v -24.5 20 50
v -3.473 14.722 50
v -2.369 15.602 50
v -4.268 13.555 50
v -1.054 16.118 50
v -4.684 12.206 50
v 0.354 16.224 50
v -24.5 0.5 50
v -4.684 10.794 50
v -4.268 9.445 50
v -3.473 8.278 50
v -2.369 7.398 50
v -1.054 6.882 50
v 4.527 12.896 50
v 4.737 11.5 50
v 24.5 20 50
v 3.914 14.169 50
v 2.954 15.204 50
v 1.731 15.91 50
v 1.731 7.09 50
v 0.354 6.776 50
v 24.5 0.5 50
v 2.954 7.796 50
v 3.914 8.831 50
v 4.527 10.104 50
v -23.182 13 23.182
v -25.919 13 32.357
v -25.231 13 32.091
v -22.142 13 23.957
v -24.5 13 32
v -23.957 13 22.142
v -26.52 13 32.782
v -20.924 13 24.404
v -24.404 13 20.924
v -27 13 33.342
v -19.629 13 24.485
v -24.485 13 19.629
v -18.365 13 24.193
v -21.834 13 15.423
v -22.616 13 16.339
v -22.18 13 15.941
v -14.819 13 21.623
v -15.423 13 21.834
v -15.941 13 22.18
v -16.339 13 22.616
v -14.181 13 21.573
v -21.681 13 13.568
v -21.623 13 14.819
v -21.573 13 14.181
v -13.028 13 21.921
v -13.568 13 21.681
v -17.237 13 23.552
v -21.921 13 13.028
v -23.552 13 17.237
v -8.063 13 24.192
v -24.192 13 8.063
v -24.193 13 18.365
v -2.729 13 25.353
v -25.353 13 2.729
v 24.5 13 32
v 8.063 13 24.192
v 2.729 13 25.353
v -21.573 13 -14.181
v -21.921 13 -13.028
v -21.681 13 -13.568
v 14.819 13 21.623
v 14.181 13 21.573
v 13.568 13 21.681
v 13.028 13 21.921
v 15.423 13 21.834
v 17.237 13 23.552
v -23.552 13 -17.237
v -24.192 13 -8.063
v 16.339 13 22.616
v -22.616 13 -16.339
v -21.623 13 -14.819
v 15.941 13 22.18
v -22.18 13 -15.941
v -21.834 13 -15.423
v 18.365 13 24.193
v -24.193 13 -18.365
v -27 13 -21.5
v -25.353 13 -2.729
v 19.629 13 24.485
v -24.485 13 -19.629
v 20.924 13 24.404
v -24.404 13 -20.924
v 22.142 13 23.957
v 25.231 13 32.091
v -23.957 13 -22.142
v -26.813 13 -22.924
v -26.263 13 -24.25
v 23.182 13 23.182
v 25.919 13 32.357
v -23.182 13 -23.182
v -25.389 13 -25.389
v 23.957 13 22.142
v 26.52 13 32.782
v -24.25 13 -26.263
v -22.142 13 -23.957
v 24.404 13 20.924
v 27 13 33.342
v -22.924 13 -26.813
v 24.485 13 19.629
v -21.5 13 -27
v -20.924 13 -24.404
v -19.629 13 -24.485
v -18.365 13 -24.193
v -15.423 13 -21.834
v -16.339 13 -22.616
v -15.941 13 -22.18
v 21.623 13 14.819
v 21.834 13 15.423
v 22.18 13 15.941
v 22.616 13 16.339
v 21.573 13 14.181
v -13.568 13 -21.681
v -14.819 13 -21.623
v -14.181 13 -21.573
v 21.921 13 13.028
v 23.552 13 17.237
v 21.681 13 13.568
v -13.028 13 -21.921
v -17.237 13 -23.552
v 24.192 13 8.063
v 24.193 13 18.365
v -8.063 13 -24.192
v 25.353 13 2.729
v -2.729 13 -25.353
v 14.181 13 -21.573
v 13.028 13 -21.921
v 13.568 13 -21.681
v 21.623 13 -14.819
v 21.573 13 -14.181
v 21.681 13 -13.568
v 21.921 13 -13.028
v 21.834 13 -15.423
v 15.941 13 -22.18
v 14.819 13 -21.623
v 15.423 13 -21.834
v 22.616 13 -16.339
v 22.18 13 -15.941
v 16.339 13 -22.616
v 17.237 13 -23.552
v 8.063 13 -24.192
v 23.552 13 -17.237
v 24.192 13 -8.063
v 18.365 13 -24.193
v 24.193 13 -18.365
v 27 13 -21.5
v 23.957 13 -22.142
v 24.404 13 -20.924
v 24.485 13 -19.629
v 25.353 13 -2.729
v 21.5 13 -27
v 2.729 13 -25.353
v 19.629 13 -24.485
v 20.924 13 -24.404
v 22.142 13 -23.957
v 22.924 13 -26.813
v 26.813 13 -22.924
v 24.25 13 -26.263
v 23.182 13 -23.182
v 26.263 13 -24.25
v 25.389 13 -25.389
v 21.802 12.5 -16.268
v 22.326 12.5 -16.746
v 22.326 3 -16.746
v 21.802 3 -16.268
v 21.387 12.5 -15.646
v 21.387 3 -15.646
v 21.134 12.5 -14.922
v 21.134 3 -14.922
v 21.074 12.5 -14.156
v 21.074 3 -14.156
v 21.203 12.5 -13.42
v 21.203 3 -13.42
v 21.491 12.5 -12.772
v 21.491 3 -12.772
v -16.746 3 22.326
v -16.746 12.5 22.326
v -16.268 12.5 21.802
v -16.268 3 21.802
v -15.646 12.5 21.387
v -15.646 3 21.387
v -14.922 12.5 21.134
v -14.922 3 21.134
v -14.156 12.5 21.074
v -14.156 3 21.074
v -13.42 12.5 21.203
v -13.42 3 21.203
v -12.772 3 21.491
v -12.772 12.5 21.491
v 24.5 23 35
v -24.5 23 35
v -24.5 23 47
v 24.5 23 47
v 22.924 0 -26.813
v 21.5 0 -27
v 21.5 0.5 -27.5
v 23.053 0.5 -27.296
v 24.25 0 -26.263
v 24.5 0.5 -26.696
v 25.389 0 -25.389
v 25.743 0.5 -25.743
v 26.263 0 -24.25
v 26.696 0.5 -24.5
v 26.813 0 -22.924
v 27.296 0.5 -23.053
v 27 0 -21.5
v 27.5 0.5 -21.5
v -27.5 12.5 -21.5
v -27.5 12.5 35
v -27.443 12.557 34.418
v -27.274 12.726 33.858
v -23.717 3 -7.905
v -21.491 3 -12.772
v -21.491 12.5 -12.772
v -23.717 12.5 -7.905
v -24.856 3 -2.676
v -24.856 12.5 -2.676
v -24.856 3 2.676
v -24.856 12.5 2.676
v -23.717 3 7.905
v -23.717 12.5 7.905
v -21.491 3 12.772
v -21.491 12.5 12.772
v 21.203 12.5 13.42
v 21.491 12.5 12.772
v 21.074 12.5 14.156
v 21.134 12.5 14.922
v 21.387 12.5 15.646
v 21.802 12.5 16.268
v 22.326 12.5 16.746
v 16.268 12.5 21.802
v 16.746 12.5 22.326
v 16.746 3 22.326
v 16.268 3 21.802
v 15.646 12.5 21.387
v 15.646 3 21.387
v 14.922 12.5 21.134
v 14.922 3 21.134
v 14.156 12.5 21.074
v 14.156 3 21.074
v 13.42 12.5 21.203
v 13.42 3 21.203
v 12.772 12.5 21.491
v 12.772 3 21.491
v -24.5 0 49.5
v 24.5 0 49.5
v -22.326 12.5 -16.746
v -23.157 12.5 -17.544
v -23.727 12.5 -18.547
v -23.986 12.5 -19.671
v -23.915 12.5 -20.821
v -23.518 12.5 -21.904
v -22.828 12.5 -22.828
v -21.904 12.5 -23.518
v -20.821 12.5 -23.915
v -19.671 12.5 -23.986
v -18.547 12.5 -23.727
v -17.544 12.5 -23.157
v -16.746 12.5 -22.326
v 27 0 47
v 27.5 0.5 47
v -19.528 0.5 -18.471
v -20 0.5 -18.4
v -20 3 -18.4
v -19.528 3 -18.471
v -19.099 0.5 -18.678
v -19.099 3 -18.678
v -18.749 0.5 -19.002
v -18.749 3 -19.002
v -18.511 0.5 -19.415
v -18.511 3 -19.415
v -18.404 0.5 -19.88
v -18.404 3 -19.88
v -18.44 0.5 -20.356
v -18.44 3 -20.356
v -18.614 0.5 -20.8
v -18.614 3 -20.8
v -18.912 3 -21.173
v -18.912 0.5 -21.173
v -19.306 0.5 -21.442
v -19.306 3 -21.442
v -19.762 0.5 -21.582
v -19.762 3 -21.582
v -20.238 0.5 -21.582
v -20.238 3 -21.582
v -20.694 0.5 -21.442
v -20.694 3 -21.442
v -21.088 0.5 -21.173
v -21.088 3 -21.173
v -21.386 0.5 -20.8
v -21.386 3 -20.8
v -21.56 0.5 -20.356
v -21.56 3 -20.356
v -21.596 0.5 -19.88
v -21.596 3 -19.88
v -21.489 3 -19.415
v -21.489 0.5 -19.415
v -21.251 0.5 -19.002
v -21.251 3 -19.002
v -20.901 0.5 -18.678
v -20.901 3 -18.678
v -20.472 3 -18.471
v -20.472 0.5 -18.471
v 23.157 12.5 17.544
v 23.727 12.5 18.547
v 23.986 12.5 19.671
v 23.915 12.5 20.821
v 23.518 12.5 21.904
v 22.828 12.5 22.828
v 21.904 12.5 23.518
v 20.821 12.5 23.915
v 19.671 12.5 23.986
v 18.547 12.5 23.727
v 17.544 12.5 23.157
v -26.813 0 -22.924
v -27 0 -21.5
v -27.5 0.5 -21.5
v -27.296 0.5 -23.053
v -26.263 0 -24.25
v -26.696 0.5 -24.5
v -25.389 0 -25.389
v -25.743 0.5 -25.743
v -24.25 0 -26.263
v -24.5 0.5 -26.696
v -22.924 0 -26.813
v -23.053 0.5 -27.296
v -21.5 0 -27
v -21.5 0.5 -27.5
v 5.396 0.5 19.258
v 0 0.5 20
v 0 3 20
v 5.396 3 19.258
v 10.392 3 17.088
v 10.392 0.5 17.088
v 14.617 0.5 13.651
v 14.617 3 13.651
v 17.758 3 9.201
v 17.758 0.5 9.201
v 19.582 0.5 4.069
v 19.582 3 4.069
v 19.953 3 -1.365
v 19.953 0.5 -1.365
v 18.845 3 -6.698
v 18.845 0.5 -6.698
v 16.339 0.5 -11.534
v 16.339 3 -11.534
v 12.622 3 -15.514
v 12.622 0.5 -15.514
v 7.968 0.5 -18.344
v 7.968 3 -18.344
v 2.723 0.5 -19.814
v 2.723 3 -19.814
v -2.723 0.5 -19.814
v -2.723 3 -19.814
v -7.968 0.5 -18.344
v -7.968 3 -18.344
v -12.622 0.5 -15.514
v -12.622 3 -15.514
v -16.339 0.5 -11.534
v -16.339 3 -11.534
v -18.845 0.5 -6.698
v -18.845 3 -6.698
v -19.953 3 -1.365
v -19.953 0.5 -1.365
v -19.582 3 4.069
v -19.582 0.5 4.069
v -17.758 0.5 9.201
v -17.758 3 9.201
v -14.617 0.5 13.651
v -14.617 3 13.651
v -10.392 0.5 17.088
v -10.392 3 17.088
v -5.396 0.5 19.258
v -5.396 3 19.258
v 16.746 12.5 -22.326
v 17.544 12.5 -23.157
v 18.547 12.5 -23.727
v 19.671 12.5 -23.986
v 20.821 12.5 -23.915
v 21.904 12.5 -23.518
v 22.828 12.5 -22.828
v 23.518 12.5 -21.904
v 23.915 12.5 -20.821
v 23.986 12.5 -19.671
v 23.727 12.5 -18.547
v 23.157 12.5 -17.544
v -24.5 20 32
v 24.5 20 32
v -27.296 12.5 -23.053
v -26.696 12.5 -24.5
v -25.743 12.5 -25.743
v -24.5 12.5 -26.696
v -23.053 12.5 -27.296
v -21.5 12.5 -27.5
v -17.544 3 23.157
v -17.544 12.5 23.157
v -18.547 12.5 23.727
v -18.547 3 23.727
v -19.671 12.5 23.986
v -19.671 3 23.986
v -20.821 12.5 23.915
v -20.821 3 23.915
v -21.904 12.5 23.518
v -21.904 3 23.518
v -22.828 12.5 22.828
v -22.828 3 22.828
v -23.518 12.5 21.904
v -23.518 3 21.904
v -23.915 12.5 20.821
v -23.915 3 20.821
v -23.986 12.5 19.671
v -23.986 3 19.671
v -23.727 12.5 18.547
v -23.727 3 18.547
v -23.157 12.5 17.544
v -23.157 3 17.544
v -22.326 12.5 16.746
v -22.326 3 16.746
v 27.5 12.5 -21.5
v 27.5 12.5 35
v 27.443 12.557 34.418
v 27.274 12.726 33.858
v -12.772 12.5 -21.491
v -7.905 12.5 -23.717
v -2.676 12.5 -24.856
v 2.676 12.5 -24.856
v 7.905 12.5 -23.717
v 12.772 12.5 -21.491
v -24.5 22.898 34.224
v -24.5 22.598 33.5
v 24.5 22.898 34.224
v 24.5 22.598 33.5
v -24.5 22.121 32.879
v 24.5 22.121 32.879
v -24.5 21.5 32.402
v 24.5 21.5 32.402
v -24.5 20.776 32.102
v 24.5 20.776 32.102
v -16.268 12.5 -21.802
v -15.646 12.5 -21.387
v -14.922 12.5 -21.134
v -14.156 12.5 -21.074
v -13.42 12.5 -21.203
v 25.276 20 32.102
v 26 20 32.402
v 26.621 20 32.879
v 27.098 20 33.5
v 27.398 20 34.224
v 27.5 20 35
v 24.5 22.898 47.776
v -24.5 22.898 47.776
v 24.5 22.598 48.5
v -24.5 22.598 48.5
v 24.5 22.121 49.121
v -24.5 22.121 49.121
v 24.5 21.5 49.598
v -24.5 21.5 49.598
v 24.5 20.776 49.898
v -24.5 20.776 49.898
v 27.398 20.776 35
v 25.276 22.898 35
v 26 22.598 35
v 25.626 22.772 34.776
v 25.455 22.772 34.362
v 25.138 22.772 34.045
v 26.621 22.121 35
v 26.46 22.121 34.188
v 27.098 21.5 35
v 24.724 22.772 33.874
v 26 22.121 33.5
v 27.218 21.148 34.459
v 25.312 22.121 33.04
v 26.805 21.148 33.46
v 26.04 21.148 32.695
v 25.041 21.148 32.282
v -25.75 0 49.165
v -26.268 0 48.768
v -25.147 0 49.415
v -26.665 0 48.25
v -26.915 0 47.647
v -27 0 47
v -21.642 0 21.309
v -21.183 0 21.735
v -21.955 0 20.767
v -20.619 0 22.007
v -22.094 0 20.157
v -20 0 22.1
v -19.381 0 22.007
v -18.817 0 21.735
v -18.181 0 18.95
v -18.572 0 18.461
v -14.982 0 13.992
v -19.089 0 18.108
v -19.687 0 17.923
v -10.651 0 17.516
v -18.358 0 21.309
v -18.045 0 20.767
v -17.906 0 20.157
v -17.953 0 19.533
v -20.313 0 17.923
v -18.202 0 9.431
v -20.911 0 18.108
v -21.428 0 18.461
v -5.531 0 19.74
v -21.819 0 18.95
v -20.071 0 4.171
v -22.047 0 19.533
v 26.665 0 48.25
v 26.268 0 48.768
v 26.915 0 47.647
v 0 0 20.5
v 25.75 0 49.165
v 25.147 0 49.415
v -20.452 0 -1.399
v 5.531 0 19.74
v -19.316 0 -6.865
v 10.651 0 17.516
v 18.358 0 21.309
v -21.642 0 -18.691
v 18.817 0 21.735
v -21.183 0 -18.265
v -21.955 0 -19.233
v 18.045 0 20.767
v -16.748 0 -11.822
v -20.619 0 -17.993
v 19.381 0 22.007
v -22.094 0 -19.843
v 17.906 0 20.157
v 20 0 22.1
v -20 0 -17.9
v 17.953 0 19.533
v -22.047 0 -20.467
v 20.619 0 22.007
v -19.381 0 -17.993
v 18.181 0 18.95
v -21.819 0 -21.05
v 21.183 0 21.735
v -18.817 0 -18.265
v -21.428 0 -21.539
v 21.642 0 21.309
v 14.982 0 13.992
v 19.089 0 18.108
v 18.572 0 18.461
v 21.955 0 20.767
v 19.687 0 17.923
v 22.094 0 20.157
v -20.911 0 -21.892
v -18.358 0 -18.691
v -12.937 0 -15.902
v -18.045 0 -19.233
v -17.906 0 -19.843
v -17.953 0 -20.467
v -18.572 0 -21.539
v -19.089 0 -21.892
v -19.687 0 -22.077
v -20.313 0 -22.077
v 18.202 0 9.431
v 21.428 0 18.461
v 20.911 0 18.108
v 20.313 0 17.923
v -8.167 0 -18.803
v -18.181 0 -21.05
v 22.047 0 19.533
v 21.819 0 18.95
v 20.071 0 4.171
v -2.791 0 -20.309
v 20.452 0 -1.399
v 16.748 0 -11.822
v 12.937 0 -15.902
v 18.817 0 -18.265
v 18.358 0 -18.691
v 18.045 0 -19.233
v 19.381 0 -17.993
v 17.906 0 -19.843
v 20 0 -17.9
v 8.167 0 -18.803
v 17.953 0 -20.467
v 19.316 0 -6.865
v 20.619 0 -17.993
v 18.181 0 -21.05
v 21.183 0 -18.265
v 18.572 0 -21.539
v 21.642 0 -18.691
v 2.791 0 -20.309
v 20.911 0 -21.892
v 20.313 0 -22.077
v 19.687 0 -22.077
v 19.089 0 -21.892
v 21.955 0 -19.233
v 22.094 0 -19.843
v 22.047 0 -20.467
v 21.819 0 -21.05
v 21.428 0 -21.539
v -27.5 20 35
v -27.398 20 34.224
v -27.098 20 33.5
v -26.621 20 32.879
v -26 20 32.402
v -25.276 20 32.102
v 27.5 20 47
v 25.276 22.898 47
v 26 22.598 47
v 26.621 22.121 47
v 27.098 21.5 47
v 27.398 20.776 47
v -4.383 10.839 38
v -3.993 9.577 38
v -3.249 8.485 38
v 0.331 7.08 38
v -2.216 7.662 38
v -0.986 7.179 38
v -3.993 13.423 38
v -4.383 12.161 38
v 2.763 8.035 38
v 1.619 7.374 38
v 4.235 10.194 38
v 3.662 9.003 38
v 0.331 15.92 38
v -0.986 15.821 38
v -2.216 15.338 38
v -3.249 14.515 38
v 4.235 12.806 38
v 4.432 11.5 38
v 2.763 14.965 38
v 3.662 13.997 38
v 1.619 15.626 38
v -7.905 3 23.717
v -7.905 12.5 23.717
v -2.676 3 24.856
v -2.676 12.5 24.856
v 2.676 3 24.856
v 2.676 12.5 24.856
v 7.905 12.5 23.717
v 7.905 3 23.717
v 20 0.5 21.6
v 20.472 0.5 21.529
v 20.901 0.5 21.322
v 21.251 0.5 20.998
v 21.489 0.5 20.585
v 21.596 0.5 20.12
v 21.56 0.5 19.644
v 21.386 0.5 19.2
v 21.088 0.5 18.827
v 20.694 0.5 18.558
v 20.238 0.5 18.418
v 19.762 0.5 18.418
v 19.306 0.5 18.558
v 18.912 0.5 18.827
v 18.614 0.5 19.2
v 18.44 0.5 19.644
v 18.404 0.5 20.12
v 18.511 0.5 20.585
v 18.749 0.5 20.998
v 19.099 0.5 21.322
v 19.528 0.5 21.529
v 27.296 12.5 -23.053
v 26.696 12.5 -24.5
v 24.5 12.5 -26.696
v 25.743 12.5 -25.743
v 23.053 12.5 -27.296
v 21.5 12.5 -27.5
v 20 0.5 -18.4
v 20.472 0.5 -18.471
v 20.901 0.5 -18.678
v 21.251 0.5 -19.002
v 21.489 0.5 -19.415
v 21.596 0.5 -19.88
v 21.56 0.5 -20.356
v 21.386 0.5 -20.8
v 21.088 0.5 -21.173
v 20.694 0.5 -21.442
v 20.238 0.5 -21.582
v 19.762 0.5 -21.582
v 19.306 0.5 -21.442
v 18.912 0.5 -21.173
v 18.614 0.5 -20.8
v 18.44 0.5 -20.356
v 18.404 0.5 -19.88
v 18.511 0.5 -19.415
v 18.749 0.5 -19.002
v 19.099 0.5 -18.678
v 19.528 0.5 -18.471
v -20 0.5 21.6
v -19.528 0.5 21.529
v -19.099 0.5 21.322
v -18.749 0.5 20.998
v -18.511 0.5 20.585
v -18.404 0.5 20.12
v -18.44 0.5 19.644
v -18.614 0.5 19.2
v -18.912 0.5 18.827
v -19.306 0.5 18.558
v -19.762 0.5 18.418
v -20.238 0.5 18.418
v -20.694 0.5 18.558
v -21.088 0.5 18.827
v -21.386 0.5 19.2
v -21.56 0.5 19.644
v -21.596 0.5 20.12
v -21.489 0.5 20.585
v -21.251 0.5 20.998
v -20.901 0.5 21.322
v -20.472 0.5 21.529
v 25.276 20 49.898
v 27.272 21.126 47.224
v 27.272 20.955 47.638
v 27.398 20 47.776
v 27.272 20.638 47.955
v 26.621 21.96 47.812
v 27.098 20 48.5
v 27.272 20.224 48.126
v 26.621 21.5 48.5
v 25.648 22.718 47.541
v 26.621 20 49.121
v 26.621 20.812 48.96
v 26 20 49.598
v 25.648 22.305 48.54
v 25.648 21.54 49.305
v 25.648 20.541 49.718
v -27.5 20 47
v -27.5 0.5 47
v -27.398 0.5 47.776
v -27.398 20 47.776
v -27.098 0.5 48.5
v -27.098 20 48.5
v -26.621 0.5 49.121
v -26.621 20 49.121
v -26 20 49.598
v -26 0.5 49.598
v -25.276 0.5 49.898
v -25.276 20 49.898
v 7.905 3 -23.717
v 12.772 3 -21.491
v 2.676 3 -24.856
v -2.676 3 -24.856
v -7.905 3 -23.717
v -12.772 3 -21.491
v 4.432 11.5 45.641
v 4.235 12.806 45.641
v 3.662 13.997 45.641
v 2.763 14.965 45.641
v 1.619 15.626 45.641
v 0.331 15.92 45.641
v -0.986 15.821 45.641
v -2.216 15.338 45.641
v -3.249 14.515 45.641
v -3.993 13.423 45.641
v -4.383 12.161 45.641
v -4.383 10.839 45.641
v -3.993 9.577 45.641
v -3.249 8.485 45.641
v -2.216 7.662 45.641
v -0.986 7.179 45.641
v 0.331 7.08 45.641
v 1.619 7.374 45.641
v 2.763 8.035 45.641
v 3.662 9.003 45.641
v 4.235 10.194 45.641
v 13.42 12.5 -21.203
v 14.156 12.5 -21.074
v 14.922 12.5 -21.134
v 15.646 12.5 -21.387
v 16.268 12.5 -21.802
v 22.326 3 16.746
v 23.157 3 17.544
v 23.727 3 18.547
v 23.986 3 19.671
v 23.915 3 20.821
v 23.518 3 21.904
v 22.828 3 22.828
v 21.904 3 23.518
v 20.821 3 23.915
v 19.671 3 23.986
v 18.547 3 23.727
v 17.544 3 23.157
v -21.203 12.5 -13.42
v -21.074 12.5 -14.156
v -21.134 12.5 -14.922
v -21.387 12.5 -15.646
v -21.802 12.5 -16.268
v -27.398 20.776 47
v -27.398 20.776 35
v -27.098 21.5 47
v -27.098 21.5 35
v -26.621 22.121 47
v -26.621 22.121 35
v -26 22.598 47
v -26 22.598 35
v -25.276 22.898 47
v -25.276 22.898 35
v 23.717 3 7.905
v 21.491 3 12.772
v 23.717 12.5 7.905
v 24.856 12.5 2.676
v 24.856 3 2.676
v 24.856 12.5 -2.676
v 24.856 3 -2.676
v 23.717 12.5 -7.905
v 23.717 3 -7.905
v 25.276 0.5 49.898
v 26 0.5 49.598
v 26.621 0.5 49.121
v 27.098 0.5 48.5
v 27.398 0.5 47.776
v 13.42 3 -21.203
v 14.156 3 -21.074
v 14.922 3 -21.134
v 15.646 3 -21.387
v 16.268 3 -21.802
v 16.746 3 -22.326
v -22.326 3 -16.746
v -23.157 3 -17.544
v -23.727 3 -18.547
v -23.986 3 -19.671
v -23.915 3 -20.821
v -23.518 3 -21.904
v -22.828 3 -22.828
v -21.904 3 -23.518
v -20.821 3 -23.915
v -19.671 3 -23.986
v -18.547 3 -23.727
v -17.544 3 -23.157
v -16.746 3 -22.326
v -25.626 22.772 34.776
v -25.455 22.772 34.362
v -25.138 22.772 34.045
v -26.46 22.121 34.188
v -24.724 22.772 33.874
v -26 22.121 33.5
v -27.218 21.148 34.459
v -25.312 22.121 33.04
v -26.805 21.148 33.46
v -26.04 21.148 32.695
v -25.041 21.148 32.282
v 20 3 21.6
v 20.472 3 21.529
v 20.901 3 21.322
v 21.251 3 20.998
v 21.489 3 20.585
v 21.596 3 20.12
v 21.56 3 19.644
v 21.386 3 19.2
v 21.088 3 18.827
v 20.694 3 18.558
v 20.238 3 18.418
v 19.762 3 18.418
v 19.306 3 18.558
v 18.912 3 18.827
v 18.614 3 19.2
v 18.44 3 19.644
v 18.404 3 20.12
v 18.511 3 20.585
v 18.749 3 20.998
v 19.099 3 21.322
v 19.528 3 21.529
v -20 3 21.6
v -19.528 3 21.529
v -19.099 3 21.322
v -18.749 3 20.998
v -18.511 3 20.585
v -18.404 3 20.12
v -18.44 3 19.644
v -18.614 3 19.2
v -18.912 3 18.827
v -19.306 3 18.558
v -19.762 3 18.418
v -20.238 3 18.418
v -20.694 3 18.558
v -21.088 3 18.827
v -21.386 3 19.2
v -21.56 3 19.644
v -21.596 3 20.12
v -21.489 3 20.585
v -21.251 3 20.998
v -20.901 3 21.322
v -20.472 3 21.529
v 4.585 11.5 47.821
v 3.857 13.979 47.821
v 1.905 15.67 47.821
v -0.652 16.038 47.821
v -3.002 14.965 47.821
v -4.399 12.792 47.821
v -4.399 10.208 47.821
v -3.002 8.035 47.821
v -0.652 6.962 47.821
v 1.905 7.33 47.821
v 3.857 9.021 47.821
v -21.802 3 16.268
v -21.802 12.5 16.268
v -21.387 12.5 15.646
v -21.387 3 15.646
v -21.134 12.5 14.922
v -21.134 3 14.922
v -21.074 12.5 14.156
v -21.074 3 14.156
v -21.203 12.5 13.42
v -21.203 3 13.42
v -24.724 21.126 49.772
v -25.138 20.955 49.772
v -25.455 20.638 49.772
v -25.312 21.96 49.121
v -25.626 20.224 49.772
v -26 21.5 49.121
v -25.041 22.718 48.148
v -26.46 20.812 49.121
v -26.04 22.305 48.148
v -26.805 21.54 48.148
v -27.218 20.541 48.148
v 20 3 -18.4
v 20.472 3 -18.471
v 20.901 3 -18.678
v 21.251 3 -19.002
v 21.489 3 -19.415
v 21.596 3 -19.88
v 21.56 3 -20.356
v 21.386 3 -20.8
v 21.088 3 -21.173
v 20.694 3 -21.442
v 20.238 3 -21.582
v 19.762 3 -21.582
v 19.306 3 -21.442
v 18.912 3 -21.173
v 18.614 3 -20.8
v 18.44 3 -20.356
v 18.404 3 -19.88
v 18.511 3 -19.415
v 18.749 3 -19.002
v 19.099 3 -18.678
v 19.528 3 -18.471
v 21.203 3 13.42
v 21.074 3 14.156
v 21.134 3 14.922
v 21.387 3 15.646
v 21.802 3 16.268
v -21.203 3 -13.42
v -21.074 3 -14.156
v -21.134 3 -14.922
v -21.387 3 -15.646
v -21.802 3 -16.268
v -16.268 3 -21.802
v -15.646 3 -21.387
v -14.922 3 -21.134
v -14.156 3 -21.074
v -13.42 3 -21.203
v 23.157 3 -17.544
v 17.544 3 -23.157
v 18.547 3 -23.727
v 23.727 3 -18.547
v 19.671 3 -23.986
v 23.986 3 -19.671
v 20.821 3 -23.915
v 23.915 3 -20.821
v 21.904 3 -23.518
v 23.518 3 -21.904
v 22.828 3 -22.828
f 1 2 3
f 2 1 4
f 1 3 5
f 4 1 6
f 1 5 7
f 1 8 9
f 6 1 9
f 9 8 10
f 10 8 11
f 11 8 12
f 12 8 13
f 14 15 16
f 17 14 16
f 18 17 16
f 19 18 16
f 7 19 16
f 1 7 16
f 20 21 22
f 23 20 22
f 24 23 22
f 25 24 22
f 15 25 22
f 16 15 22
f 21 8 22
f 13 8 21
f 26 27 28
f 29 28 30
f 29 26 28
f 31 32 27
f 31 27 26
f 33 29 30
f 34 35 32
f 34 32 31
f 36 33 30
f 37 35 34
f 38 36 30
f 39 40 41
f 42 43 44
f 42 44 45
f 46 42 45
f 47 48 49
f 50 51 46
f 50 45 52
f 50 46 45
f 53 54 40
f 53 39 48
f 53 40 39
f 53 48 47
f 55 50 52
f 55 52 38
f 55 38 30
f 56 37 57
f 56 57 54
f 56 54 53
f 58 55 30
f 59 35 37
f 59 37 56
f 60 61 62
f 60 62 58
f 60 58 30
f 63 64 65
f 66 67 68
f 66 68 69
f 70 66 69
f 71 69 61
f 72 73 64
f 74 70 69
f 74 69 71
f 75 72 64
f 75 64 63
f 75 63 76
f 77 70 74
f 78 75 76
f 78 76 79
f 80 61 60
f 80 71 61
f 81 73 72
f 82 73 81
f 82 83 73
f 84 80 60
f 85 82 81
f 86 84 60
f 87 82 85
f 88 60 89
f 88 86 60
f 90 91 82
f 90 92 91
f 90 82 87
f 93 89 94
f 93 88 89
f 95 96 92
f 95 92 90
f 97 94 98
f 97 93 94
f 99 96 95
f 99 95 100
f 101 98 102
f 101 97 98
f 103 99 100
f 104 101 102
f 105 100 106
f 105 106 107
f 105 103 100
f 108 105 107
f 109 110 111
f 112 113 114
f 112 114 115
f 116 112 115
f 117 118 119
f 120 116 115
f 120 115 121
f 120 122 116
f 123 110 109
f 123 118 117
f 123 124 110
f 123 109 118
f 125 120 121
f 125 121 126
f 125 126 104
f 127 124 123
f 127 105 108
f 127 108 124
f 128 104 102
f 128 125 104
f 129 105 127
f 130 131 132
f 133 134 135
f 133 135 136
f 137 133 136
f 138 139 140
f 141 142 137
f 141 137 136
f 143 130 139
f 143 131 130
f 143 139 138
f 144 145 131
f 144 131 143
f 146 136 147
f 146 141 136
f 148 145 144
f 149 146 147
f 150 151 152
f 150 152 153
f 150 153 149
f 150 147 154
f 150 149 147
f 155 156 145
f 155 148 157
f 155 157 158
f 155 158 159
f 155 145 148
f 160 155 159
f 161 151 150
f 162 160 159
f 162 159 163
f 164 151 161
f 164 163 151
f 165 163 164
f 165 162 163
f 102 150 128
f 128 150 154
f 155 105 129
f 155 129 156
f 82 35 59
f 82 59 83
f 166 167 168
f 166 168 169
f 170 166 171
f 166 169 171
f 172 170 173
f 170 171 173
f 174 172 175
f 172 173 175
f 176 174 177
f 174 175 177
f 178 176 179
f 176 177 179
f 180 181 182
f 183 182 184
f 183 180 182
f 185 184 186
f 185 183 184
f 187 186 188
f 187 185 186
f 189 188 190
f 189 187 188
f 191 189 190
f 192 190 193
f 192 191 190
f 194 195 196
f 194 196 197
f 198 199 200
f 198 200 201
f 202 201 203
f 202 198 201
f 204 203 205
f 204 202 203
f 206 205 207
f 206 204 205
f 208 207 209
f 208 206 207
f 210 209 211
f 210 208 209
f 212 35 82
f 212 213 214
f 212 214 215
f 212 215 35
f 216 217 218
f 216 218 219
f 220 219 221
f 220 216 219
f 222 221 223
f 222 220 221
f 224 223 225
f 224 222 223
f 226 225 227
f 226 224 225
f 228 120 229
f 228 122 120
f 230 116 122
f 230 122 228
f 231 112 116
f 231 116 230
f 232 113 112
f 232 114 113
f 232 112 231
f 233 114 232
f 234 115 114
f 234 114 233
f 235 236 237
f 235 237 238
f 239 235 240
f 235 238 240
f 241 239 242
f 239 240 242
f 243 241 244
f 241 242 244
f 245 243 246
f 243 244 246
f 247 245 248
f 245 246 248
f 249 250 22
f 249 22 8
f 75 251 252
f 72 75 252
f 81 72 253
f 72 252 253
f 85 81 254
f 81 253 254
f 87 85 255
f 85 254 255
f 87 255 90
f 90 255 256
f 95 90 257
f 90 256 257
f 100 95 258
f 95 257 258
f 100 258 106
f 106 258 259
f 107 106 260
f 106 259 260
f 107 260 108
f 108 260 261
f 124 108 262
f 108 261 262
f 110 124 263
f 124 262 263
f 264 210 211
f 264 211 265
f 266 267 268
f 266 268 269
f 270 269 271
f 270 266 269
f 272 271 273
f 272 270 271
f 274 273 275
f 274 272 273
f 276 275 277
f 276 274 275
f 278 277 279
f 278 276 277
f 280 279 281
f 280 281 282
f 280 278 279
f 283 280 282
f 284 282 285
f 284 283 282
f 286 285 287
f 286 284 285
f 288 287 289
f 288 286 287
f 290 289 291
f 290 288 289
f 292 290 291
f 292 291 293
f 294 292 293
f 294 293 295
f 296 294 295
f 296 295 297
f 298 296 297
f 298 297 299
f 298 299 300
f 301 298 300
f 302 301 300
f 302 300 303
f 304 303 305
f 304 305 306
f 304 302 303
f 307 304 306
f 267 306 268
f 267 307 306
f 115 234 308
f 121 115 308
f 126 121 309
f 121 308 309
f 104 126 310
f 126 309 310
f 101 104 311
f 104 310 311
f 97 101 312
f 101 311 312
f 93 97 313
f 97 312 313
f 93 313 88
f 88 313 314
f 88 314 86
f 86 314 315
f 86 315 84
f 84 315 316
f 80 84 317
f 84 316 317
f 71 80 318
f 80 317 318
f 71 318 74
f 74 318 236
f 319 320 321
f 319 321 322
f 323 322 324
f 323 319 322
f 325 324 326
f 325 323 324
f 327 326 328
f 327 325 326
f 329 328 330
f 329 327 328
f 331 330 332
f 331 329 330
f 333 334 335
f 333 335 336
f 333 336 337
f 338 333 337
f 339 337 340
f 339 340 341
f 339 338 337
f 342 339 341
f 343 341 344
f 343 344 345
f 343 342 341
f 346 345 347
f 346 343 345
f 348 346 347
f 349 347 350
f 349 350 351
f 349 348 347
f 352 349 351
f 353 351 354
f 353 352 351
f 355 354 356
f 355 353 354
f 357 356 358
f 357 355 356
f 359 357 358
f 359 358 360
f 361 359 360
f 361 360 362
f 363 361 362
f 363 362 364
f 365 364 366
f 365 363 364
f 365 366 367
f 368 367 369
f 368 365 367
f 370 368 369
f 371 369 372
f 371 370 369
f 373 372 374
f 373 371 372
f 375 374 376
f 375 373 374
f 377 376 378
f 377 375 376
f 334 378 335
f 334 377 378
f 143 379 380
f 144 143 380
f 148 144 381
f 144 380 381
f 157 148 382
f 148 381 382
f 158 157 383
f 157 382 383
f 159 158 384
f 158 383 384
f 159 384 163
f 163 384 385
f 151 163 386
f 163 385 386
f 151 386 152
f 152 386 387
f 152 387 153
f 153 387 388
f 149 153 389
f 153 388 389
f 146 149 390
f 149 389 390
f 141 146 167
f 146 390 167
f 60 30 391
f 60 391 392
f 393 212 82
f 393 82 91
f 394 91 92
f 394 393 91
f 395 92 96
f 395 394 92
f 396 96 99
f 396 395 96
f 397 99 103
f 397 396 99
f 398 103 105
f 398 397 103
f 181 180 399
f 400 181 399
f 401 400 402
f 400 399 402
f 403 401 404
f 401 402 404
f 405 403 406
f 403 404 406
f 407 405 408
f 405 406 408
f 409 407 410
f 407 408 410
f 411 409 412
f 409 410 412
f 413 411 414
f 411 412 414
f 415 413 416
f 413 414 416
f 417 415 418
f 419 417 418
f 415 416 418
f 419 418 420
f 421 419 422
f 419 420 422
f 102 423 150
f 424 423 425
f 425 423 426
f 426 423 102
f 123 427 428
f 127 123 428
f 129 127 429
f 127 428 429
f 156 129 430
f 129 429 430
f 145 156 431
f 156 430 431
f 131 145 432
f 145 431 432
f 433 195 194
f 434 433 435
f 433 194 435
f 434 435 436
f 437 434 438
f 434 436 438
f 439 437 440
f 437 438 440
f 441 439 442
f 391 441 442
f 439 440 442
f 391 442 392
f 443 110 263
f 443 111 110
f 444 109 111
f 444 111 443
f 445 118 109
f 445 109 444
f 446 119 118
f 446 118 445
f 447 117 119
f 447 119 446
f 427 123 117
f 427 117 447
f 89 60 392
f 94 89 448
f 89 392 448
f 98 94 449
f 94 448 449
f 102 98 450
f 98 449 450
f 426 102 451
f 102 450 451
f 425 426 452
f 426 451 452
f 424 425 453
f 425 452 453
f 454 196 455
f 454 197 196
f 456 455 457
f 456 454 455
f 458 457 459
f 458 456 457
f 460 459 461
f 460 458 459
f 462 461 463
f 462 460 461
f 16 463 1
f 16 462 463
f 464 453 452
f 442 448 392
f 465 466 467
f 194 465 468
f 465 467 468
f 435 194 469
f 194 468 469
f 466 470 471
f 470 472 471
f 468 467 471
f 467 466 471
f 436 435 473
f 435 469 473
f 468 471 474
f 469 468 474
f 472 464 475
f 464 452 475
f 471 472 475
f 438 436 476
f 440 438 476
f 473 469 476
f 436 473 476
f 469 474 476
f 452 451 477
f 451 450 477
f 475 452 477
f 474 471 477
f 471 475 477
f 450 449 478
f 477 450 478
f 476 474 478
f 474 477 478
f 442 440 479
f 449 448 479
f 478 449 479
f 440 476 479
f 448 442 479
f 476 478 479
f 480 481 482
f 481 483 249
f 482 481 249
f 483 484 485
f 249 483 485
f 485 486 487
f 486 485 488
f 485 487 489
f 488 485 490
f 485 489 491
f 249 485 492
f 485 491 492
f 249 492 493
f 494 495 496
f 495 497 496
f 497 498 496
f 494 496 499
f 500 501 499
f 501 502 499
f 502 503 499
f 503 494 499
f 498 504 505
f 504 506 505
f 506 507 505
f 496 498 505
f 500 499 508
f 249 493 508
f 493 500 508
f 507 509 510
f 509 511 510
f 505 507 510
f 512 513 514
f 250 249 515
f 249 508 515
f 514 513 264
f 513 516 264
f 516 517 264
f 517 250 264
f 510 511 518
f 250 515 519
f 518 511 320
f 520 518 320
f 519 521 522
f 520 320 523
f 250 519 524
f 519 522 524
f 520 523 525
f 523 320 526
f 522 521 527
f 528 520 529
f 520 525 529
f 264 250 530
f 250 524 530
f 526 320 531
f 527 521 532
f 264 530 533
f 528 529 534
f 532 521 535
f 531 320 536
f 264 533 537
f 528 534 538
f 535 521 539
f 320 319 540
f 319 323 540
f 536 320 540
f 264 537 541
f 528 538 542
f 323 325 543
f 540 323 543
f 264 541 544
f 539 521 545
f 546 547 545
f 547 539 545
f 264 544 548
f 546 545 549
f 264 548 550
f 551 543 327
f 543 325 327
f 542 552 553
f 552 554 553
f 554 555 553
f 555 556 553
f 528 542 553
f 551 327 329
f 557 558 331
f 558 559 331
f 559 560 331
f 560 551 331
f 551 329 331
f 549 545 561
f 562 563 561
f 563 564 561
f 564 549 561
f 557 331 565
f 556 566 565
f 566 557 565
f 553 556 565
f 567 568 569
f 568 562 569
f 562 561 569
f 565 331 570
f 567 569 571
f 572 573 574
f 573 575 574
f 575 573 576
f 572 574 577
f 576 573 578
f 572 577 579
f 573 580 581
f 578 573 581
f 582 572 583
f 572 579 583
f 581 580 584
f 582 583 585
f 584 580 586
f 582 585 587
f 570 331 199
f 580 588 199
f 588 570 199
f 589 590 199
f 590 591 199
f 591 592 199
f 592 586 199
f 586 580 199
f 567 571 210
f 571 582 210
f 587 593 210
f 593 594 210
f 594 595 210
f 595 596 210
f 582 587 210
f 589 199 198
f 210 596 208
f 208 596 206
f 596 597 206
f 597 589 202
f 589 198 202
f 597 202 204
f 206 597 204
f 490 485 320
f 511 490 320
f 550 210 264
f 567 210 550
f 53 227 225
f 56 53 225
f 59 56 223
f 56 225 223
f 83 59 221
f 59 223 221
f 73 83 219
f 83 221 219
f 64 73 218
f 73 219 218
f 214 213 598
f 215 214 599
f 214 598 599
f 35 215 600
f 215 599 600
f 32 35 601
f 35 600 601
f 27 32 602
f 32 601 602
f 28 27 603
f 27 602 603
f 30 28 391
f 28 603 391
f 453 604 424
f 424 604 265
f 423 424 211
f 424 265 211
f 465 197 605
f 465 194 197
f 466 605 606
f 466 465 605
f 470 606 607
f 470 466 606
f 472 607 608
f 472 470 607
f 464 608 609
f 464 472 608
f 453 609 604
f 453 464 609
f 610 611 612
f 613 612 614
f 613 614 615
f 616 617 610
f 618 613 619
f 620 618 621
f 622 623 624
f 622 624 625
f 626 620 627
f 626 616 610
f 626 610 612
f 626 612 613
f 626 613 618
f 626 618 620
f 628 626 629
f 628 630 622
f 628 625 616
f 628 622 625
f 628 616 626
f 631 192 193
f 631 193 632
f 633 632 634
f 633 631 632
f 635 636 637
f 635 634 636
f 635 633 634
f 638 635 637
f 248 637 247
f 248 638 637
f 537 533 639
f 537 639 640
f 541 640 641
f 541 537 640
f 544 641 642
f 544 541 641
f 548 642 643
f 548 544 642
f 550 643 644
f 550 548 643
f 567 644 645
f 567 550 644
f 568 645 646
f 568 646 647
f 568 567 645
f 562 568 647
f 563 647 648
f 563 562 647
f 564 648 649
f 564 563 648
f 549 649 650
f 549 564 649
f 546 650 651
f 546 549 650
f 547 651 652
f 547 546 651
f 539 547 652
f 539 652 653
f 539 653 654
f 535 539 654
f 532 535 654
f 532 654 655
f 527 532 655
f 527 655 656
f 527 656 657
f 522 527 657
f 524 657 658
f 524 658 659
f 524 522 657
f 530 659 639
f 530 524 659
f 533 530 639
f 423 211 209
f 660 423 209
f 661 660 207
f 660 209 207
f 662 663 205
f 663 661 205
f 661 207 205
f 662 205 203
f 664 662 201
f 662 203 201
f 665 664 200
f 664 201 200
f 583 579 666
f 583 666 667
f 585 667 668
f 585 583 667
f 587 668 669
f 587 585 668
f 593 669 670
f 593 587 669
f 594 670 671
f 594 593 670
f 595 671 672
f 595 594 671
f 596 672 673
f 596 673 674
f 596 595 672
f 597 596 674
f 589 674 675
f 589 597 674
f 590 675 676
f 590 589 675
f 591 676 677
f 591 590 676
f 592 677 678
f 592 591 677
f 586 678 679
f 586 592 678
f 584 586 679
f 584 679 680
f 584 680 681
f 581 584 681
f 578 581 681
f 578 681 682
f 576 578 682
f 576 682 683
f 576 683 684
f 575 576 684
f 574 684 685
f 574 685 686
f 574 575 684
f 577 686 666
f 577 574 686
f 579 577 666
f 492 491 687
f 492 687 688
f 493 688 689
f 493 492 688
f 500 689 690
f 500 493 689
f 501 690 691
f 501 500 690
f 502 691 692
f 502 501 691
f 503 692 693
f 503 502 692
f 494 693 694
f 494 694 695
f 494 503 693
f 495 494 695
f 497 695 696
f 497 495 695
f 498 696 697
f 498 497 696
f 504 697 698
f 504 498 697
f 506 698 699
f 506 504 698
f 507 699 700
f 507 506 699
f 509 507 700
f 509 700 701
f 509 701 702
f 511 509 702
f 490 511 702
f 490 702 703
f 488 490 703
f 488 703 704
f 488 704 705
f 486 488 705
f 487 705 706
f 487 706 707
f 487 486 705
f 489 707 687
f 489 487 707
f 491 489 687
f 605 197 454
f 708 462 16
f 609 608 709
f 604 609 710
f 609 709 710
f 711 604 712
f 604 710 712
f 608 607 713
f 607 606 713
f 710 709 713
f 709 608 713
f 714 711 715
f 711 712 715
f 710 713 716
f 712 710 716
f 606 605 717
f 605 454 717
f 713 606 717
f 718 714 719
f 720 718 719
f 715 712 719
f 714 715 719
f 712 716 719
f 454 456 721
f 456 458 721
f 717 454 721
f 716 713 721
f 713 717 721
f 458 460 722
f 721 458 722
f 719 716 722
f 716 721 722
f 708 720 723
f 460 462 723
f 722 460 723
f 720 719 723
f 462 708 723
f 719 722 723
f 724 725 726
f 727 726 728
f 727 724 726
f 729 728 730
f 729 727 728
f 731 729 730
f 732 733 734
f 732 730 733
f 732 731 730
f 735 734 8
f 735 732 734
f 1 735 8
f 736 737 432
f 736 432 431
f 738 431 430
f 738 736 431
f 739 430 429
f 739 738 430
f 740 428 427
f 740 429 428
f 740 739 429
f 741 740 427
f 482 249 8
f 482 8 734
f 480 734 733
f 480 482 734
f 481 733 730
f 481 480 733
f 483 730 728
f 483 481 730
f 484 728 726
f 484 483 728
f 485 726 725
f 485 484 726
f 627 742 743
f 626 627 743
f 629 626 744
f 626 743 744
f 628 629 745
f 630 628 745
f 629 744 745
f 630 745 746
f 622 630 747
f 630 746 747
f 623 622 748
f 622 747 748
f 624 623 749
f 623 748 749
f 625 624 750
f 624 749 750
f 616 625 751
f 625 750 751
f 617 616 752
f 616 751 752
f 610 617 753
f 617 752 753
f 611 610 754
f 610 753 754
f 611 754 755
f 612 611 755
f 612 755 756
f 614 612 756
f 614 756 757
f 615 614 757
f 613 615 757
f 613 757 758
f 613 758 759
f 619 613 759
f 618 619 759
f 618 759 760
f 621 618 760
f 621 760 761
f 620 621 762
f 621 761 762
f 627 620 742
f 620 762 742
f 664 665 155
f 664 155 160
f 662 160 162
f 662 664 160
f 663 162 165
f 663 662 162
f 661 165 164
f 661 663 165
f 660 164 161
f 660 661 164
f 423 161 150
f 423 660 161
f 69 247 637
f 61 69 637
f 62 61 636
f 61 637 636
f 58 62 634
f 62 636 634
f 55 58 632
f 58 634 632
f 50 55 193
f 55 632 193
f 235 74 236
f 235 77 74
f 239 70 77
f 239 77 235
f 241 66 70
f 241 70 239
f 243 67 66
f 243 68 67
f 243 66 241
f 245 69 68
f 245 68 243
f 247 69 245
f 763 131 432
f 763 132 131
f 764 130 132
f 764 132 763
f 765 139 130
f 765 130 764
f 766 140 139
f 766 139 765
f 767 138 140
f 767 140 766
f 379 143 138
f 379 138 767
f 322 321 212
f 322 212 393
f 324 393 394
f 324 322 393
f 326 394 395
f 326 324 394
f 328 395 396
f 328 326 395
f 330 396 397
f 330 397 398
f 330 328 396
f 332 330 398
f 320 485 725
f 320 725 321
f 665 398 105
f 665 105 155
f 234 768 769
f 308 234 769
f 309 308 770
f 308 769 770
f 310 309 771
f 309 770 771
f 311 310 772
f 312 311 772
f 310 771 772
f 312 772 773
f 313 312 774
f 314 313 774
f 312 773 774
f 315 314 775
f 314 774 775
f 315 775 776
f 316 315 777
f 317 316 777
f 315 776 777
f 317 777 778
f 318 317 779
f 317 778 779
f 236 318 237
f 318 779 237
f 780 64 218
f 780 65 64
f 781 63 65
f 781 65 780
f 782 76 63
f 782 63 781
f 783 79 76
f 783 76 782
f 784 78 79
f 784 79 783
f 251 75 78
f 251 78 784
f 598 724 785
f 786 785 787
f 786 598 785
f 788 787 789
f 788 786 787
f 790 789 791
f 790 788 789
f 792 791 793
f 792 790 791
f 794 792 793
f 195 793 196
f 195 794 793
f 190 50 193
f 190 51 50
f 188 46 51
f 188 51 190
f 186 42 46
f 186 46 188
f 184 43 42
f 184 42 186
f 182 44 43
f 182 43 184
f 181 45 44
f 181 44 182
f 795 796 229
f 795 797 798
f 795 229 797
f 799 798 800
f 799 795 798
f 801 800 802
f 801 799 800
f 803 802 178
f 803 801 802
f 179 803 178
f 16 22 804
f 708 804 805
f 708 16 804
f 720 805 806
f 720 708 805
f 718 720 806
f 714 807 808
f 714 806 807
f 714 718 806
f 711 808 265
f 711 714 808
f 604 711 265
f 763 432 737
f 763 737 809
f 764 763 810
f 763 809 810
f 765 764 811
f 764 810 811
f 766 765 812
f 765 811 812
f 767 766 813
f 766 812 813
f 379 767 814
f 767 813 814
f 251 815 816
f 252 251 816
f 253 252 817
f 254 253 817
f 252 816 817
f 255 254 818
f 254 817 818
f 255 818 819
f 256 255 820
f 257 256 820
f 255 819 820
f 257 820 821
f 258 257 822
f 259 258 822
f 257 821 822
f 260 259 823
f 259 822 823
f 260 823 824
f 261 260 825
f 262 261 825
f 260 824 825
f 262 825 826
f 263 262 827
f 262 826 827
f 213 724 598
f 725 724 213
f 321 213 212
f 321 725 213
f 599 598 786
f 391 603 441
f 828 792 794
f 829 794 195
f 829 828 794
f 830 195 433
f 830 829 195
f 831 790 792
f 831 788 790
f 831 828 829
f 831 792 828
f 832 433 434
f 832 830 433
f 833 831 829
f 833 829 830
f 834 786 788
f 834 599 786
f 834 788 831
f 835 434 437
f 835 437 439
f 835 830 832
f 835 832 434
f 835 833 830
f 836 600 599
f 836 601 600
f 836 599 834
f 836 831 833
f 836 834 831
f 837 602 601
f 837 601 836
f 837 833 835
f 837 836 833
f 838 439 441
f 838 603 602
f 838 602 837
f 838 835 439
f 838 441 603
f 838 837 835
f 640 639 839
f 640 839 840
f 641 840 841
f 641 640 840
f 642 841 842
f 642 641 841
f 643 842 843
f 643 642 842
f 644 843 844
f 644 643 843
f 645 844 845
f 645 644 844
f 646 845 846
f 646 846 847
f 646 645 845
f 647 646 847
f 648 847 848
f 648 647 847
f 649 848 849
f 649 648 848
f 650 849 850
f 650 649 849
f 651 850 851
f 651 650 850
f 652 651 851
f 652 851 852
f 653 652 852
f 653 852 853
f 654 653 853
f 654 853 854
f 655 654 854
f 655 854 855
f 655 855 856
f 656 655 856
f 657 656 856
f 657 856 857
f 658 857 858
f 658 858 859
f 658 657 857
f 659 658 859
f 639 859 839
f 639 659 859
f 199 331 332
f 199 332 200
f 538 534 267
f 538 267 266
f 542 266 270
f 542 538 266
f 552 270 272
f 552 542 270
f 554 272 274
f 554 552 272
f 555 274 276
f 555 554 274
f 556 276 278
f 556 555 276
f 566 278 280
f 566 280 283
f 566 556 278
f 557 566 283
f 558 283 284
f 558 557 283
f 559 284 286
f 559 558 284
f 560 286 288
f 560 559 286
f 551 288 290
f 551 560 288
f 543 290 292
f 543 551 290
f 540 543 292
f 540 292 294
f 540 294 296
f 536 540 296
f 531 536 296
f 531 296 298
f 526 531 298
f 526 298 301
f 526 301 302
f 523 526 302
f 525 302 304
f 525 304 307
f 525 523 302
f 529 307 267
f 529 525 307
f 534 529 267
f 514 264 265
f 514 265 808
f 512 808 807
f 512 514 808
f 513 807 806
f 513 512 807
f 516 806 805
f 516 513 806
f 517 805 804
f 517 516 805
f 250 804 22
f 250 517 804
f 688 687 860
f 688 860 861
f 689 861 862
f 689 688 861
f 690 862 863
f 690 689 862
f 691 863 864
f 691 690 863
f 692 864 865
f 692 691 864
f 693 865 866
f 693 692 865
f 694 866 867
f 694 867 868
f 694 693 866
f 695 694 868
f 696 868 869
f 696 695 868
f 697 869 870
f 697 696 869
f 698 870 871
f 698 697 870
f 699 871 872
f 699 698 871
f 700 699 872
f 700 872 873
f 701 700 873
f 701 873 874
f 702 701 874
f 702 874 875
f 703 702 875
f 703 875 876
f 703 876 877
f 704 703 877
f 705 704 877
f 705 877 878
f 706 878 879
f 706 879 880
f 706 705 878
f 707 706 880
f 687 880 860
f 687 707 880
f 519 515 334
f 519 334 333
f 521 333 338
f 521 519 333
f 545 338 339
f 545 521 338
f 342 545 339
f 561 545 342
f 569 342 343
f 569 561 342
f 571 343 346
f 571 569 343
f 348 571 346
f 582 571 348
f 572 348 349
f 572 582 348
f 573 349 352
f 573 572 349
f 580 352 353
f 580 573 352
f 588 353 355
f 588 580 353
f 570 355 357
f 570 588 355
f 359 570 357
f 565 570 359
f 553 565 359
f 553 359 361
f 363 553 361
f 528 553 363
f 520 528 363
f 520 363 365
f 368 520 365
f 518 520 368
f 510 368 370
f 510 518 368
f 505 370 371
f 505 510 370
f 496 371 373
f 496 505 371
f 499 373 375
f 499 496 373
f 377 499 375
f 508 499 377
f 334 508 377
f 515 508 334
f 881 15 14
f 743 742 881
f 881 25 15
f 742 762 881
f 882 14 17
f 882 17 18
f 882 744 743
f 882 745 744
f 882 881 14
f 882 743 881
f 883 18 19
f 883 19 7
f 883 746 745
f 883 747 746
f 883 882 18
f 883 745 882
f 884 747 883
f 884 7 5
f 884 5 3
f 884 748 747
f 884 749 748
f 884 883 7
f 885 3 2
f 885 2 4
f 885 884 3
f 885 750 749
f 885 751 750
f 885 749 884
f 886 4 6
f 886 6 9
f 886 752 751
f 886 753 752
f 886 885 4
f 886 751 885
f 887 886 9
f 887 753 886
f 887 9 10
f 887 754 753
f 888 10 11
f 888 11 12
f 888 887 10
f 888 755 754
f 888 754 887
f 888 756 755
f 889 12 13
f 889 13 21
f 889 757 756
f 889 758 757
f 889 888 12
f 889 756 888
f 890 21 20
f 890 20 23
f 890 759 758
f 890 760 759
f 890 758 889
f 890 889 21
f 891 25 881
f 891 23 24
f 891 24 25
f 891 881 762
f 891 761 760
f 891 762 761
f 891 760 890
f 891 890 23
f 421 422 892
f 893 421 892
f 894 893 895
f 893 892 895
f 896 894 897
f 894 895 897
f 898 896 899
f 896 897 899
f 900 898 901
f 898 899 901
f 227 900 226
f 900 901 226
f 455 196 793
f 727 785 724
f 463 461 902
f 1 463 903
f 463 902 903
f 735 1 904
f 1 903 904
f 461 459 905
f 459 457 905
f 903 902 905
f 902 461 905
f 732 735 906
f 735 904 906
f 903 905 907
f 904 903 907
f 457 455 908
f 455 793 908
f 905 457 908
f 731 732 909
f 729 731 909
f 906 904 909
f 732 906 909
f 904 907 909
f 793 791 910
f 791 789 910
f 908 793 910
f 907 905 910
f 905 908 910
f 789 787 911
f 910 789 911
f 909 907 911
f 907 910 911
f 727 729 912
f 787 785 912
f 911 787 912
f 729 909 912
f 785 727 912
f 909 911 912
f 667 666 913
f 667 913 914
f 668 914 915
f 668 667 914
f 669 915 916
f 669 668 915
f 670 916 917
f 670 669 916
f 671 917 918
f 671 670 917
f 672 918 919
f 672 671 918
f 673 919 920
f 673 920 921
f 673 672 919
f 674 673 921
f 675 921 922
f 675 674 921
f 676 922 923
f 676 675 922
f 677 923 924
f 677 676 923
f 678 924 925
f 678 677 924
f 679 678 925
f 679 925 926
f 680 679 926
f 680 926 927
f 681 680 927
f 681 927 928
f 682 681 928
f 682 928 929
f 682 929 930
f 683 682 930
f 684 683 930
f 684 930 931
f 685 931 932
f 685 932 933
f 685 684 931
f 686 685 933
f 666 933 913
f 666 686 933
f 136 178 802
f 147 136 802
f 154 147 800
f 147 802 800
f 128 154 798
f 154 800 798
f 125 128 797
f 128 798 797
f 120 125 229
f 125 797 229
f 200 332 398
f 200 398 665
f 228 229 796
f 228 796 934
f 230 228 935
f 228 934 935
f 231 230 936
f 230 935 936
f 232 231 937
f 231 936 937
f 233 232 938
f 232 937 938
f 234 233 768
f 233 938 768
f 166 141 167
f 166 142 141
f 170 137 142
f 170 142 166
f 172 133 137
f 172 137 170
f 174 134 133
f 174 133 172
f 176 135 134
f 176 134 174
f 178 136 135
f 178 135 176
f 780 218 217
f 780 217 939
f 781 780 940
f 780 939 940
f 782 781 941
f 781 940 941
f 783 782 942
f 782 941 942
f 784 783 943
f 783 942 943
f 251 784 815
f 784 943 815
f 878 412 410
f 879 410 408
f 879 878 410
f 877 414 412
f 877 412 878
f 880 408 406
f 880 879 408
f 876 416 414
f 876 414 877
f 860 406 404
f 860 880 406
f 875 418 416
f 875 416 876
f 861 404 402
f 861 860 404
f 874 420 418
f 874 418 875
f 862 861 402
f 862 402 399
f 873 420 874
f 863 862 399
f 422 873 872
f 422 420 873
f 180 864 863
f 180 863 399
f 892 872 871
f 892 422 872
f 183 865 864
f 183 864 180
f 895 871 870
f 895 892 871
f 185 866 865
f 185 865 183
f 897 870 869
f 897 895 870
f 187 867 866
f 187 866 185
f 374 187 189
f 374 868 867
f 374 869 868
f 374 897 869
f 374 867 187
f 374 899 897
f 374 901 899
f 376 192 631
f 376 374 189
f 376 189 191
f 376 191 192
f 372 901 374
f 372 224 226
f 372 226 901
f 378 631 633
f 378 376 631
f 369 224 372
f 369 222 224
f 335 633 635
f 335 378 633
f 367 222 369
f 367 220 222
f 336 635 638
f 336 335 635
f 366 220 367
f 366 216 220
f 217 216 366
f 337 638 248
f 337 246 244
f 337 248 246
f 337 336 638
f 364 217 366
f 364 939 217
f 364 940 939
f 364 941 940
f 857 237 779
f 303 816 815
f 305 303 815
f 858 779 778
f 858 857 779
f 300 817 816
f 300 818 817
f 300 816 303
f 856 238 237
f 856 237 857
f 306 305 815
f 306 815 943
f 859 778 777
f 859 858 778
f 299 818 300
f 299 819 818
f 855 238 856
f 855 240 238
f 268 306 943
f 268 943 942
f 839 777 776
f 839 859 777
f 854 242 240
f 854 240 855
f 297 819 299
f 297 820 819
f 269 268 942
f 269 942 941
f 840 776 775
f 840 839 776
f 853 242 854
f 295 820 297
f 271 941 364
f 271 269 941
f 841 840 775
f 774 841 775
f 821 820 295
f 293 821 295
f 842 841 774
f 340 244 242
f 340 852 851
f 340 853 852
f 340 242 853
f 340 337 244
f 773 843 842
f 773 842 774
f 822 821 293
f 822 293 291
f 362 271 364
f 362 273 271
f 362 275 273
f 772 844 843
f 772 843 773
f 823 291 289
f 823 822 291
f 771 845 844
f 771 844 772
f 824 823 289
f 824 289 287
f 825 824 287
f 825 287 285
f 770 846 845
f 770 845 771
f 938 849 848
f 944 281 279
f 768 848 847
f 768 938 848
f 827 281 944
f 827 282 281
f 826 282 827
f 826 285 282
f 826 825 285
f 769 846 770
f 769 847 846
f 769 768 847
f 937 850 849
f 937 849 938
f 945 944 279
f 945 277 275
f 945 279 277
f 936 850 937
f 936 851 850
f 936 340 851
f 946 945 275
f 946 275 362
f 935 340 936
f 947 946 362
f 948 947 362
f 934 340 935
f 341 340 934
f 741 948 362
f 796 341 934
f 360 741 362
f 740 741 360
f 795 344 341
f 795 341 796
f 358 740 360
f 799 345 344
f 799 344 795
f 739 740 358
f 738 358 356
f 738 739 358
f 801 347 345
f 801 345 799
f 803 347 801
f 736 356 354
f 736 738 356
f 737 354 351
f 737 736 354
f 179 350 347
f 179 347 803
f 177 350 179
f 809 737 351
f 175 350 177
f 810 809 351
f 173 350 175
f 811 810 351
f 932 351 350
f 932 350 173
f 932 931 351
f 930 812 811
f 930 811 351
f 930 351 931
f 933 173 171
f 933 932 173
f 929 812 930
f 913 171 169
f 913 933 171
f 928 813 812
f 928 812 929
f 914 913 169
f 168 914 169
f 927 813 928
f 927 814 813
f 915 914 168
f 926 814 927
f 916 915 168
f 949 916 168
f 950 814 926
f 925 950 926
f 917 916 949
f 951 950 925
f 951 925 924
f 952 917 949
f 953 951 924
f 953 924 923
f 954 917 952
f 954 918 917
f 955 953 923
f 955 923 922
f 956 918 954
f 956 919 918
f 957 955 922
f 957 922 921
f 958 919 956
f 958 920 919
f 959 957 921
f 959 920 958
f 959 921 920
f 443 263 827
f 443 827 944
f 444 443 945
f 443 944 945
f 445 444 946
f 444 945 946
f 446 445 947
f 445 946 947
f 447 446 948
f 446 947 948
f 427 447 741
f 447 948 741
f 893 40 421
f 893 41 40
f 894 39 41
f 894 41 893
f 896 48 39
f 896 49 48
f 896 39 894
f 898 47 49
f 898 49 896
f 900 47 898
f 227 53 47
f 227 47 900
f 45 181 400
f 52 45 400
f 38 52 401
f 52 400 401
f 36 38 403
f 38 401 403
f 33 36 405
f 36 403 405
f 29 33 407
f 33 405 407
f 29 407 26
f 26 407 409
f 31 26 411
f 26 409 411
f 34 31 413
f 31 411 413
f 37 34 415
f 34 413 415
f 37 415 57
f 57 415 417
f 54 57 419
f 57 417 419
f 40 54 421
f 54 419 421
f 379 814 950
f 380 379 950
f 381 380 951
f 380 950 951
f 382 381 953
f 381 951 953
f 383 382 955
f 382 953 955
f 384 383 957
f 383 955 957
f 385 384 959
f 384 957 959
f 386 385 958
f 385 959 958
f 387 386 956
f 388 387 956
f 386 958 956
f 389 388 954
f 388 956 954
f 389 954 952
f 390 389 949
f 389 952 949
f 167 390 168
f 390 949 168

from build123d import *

# Parameters (mm, degrees)
SKETCH3_W                = 55
SKETCH3_H                = 77.5
SKETCH3_R                = 20
SKETCH3_R_2              = 1.6
BOSS_EXTRUDE1_DEPTH      = 3
SKETCH4_W                = 55
SKETCH4_H                = 77.5
SKETCH4_R                = 25
BOSS_EXTRUDE2_DEPTH      = 10
SKETCH5_R                = 4
CUT_EXTRUDE1_DEPTH       = 11
FILLET1_R                = 3
FILLET2_R                = 6
SKETCH6_W                = 55
SKETCH6_H                = 18
BOSS_EXTRUDE3_DEPTH      = 10
SKETCH7_R                = 4.4323
TRIPODMOUNT_DEPTH        = 12
FILLET3_R                = 3
CHAMFER1_SIZE            = 0.5
CHAMFER3_SIZE            = 0.5
CHAMFERTRIPODMOUNT_SIZE  = 0.3048
CHAMFERTRIPODMOUNT_SIZE2 = 4.358843075


with BuildPart() as part:
    # Sketch3 → Boss-Extrude1 (new body)
    with BuildSketch(Plane(origin=(0, 0, 0), x_dir=(1, 0, 0), z_dir=(0, 1, 0))):
        with Locations((0, -11.25)):
            Rectangle(SKETCH3_W, SKETCH3_H)
        with Locations(Location((0, 0, 0), (0, 0, 270))):  # turned: the seam where the file's is
            Circle(SKETCH3_R, mode=Mode.SUBTRACT)
        with Locations(Location((-20, 20, 0), (0, 0, 270))):  # turned: the seam where the file's is
            Circle(SKETCH3_R_2, mode=Mode.SUBTRACT)
        with Locations(Location((20, 20, 0), (0, 0, 270))):  # turned: the seam where the file's is
            Circle(SKETCH3_R_2, mode=Mode.SUBTRACT)
        with Locations(Location((20, -20, 0), (0, 0, 270))):  # turned: the seam where the file's is
            Circle(SKETCH3_R_2, mode=Mode.SUBTRACT)
        with Locations(Location((-20, -20, 0), (0, 0, 270))):  # turned: the seam where the file's is
            Circle(SKETCH3_R_2, mode=Mode.SUBTRACT)
    extrude(amount=BOSS_EXTRUDE1_DEPTH)

    # Sketch4 → Boss-Extrude2 (add)
    with BuildSketch(Plane(origin=(0, 3, 0), x_dir=(1, 0, 0), z_dir=(0, 1, 0))):
        with Locations((0, -11.25)):
            Rectangle(SKETCH4_W, SKETCH4_H)
        with Locations(Location((0, 0, 0), (0, 0, 270))):  # turned: the seam where the file's is
            Circle(SKETCH4_R, mode=Mode.SUBTRACT)
    extrude(amount=BOSS_EXTRUDE2_DEPTH)

    # Sketch5 → Cut-Extrude1 (cut, through all)
    with BuildSketch(Plane.XZ.offset(-3)):
        with Locations((20, -20)):
            Circle(SKETCH5_R)
        with Locations((-20, -20)):
            Circle(SKETCH5_R)
        with Locations((-20, 20)):
            Circle(SKETCH5_R)
        with Locations((20, 20)):
            Circle(SKETCH5_R)
    extrude(amount=-CUT_EXTRUDE1_DEPTH, mode=Mode.SUBTRACT)

    # Fillet1
    fillet1_edges = [part.edges().sort_by_distance(p)[0] for p in [
        (16.095976426, 8, 19.129023574),
        (19.129023574, 8, 16.095976426),
        (-19.129023574, 8, 16.095976426),
        (-16.095976426, 8, 19.129023574),
        (-16.095976426, 8, -19.129023574),
        (-19.129023574, 8, -16.095976426),
        (19.129023574, 8, -16.095976426),
        (16.095976426, 8, -19.129023574),
    ]]
    fillet(fillet1_edges, radius=FILLET1_R)

    # Fillet2
    fillet2_edges = [part.edges().sort_by_distance(p)[0] for p in [
        (-27.5, 6.5, -27.5),
        (27.5, 6.5, -27.5),
    ]]
    fillet(fillet2_edges, radius=FILLET2_R)

    # Sketch6 → Boss-Extrude3 (add)
    with BuildSketch(Plane(origin=(0, 13, 0), x_dir=(1, 0, 0), z_dir=(0, 1, 0))):
        with Locations((0, -41)):
            Rectangle(SKETCH6_W, SKETCH6_H)
    extrude(amount=BOSS_EXTRUDE3_DEPTH)

    # Sketch7 → TripodMount (cut)
    with BuildSketch(Plane.XY.offset(50)):
        with Locations((0, 11.5)):
            Circle(SKETCH7_R)
    extrude(amount=-TRIPODMOUNT_DEPTH, mode=Mode.SUBTRACT)

    # Fillet3
    fillet3_edges = [part.edges().sort_by_distance(p)[0] for p in [
        (-27.5, 18, 32),
        (27.5, 18, 32),
        (-27.5, 23, 41),
        (0, 23, 50),
        (27.5, 23, 41),
        (0, 23, 32),
        (27.5, 11.5, 50),
        (-27.5, 11.5, 50),
    ]]
    fillet(fillet3_edges, radius=FILLET3_R)

    # Chamfer1
    chamfer1_edges = [part.edges().sort_by_distance(p)[0] for p in [
        (0, 0, -20),
        (0, 0, -27.5),
        (-27.5, 0, 12.75),
        (-25.742640687, 0, -25.742640687),
        (25.742640687, 0, -25.742640687),
        (20, 0, -21.6),
        (27.5, 0, 12.75),
        (0, 0, 50),
        (-26.621320344, 0, 49.121320344),
        (26.621320344, 0, 49.121320344),
        (20, 0, 18.4),
        (-20, 0, 18.4),
        (-20, 0, -21.6),
    ]]
    chamfer(chamfer1_edges, length=CHAMFER1_SIZE)

    # Chamfer3
    chamfer3_edges = [part.edges().sort_by_distance(p)[0] for p in [
        (22.828427125, 13, 22.828427125),
        (0, 13, 25),
        (-22.828427125, 13, 22.828427125),
        (-25, 13, 0),
        (-22.828427125, 13, -22.828427125),
        (0, 13, -25),
        (25, 13, 0),
        (-14.921579234, 13, -21.134173852),
        (-21.134173852, 13, -14.921579234),
        (-21.134173852, 13, 14.921579234),
        (14.921579234, 13, -21.134173852),
        (21.134173852, 13, 14.921579234),
        (14.921579234, 13, 21.134173852),
        (-14.921579234, 13, 21.134173852),
        (21.134173852, 13, -14.921579234),
        (0, 13, -27.5),
        (-27.5, 13, 5.25),
        (-25.742640687, 13, -25.742640687),
        (25.742640687, 13, -25.742640687),
        (27.5, 13, 5.25),
        (22.828427125, 13, -22.828427125),
    ]]
    chamfer(chamfer3_edges, length=CHAMFER3_SIZE)

    # ChamferTripodMount
    chamfertripodmount_edges = [part.edges().sort_by_distance(p)[0] for p in [
        (-4.4323, 11.5, 50),
    ]]
    chamfertripodmount_side = [part.faces().sort_by_distance(p)[0] for p in [
        (23.972624422, 10.25, 50),
    ]]
    chamfer(chamfertripodmount_edges, length=CHAMFERTRIPODMOUNT_SIZE, length2=CHAMFERTRIPODMOUNT_SIZE2, reference=chamfertripodmount_side[0])


solid = part.part
